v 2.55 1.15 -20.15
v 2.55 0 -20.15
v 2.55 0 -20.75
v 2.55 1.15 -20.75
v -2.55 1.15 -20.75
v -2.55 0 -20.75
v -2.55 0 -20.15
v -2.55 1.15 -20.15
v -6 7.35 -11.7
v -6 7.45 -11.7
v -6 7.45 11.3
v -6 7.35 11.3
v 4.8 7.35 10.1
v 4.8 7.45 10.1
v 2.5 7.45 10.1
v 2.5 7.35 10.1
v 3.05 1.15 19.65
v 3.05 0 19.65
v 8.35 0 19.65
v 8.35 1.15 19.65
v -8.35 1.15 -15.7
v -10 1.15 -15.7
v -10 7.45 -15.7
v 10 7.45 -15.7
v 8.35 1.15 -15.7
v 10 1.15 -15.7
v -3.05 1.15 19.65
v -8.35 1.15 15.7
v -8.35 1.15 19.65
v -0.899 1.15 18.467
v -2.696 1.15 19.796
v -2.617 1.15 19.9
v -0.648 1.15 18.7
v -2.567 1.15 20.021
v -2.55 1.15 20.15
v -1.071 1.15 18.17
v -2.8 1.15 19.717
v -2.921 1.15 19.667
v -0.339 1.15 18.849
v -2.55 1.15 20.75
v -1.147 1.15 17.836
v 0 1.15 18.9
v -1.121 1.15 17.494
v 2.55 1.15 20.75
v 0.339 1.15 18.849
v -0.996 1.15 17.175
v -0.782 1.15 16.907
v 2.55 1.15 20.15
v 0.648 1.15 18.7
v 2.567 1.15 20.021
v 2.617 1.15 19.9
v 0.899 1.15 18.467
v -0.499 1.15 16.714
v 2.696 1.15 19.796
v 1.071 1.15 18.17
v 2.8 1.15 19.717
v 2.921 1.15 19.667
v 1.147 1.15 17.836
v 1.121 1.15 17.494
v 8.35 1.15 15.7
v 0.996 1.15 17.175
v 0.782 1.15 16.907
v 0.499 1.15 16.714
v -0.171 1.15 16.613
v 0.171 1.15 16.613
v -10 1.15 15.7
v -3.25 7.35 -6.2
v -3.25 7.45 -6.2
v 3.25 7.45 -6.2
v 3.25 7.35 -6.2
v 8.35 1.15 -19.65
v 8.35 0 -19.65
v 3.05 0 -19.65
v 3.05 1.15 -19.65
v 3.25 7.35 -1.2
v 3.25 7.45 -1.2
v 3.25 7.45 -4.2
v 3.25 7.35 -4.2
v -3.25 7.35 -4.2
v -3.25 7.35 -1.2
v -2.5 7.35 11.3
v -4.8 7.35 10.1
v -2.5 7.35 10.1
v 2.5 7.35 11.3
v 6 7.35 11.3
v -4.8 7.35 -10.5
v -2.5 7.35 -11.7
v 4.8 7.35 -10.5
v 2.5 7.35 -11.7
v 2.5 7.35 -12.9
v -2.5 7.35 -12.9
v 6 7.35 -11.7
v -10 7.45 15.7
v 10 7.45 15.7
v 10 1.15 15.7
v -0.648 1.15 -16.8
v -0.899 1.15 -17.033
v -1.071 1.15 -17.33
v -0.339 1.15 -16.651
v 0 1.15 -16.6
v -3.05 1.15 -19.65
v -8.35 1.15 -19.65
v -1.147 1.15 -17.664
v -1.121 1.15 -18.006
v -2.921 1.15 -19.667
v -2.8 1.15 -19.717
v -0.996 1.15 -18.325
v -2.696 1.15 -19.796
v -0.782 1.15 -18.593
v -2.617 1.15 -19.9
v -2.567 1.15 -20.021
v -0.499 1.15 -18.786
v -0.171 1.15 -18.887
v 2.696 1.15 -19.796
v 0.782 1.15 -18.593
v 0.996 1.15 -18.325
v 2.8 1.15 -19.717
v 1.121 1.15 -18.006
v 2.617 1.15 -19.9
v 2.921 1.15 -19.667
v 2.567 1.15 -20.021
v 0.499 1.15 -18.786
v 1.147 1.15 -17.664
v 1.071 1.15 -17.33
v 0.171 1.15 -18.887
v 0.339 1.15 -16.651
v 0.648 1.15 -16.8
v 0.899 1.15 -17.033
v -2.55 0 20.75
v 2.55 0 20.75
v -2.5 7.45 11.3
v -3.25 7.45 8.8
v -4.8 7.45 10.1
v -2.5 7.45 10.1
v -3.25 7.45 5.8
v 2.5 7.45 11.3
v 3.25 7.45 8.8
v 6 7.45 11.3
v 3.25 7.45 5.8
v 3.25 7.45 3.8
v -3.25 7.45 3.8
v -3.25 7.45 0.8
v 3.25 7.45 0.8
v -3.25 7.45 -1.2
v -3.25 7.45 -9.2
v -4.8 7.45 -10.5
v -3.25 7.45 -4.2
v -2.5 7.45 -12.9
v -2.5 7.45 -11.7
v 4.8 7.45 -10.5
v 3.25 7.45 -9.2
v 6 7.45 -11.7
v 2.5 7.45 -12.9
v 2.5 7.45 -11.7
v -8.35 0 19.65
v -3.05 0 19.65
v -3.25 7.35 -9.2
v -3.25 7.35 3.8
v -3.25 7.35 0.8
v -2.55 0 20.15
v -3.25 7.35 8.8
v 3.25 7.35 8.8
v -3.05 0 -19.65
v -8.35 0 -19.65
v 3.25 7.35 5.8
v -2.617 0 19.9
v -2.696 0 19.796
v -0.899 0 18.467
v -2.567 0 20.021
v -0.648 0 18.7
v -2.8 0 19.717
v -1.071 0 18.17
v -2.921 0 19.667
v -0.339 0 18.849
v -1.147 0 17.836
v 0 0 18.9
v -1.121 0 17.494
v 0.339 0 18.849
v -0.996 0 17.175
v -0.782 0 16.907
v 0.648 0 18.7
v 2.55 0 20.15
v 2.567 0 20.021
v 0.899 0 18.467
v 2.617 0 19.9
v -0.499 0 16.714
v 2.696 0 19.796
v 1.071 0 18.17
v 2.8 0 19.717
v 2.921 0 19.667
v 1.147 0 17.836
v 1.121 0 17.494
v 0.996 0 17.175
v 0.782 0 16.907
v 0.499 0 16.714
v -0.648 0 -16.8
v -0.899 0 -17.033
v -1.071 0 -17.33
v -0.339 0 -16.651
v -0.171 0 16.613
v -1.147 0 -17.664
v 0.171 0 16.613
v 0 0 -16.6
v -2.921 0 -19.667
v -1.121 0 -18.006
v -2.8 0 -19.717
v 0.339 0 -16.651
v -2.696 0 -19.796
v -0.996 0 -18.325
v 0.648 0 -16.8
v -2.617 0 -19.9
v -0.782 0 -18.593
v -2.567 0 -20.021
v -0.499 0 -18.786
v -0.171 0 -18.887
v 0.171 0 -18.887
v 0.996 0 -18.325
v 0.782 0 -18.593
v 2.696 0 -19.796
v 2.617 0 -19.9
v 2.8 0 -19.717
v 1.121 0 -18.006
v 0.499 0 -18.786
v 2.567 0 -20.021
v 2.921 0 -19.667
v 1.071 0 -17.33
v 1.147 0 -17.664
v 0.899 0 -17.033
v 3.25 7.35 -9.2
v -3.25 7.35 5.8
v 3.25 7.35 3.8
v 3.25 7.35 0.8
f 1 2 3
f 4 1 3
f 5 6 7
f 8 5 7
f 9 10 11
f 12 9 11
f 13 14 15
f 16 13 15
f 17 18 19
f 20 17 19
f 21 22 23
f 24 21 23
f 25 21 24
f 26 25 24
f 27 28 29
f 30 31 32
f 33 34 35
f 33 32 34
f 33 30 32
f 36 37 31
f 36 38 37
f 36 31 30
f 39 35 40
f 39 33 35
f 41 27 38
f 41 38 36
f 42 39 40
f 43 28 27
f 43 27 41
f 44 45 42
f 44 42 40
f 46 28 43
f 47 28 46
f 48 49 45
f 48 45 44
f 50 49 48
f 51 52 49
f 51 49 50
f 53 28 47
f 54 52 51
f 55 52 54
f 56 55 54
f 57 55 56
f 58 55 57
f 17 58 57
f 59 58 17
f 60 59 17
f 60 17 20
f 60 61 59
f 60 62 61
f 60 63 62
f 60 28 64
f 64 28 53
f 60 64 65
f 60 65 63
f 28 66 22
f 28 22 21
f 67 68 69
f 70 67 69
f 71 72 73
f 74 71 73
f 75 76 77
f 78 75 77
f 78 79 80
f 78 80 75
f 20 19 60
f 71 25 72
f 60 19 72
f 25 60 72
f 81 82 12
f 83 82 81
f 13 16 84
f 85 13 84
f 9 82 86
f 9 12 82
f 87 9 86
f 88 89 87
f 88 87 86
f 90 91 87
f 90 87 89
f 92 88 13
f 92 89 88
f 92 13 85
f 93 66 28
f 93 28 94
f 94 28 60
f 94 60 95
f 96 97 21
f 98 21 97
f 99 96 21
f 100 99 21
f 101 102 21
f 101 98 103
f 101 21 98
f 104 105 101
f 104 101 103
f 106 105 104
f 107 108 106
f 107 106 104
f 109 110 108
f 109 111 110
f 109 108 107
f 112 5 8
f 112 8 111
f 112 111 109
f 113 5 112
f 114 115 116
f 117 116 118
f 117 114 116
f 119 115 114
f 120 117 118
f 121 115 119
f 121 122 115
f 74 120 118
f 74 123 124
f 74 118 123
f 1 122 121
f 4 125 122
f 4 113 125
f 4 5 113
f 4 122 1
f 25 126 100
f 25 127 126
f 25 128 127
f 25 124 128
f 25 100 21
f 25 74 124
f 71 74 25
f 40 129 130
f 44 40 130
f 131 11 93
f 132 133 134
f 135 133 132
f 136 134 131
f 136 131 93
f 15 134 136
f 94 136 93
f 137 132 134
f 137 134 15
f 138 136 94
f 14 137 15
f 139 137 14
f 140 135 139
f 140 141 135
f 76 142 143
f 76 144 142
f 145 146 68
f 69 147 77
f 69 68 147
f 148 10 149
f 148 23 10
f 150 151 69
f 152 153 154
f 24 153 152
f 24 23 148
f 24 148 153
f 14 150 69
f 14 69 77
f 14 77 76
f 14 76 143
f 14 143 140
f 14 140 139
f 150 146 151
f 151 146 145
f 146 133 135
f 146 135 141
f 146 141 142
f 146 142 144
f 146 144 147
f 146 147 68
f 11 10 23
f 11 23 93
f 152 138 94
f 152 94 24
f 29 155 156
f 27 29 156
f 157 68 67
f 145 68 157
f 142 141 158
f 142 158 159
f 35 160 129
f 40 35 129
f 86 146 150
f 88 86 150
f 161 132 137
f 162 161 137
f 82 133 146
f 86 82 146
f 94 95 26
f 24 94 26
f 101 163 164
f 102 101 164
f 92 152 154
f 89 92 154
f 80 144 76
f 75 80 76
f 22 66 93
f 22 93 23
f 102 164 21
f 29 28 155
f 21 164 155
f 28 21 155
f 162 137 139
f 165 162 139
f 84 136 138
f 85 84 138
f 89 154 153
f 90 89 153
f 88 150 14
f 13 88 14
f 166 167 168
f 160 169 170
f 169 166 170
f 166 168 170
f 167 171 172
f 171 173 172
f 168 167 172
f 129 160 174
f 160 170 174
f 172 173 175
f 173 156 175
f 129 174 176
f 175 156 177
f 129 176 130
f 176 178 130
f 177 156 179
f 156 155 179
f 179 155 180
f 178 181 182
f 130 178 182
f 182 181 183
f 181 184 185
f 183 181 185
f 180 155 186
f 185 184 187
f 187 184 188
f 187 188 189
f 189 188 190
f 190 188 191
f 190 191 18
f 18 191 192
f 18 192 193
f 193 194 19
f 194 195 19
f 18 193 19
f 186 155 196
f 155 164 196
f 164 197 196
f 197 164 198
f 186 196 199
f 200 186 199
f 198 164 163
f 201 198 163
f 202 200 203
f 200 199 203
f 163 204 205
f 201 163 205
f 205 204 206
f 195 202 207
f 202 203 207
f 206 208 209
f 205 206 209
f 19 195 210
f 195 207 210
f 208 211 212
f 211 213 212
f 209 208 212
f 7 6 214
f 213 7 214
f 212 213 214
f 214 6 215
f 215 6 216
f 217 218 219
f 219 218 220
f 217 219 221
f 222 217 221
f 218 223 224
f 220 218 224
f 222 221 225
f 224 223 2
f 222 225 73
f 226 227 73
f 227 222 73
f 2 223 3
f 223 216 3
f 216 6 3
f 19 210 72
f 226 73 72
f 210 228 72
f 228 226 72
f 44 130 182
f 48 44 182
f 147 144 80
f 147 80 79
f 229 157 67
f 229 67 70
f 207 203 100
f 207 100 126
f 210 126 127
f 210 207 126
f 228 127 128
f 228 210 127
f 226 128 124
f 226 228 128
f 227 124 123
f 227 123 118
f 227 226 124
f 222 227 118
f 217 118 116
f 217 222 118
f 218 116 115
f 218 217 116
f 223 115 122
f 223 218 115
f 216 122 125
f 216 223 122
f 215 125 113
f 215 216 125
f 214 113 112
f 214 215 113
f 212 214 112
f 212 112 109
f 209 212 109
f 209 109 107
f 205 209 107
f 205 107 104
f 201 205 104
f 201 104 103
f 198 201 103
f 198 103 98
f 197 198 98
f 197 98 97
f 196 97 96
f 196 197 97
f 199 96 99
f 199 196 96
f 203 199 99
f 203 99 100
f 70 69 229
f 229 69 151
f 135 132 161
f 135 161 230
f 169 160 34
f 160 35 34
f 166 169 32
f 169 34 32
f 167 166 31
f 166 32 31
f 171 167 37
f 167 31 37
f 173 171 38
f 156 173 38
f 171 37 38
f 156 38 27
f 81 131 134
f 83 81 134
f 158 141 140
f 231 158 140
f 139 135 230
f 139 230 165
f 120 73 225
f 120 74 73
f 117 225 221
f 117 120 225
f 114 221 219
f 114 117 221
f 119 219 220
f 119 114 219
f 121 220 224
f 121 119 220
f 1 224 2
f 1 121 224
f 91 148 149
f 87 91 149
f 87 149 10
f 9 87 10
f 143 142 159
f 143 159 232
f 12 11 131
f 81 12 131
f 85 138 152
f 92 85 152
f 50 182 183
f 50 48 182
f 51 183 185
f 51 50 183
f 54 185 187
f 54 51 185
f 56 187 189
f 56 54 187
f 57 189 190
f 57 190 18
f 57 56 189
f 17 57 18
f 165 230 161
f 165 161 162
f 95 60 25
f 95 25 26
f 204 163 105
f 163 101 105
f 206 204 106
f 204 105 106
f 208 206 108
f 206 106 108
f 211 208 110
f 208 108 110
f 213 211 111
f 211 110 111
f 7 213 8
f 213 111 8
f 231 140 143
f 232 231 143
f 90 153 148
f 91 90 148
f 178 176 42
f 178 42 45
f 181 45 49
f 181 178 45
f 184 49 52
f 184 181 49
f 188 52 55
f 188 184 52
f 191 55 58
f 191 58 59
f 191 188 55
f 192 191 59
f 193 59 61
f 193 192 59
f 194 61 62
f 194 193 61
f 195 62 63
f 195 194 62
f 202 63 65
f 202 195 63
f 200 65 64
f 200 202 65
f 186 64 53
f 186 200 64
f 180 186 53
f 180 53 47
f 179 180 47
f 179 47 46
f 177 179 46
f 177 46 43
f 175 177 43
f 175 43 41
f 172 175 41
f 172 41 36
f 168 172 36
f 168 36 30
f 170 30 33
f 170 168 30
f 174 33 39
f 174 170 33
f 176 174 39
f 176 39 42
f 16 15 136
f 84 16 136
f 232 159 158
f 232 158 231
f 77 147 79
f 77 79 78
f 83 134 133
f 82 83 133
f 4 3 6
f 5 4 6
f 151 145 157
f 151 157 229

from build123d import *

# Parameters (mm, degrees)
ESQUISSE1_R             = 1.15
BOSS_EXTRU_1_DEPTH      = 1.15
CONG_1_R                = 0.5
ESQUISSE2_W             = 20
ESQUISSE2_H             = 31.4
BOSS_EXTRU_2_DEPTH      = 6.3
ESQUISSE4_W             = 6.5
ESQUISSE4_H             = 3
ENL_V_MAT_EXTRU_1_DEPTH = 0.1


with BuildPart() as part:
    # Esquisse1 → Boss.-Extru.1 (new body)
    with BuildSketch(Plane(origin=(0, 0, 0), x_dir=(1, 0, 0), z_dir=(0, 1, 0))):
        Polygon((-2.55, -19.65), (-2.55, -20.75), (2.55, -20.75), (2.55, -19.65), (8.35, -19.65), (8.35, 19.65), (2.55, 19.65), (2.55, 20.75), (-2.55, 20.75), (-2.55, 19.65), (-8.35, 19.65), (-8.35, -19.65), align=None)
        with Locations(Location((0, -17.75, 0), (0, 0, 270))):
            Circle(ESQUISSE1_R, mode=Mode.SUBTRACT)
        with Locations(Location((0, 17.75, 0), (0, 0, 270))):
            Circle(ESQUISSE1_R, mode=Mode.SUBTRACT)
    extrude(amount=BOSS_EXTRU_1_DEPTH)

    # Congé1
    cong_1_edges = [part.edges().sort_by_distance(p)[0] for p in [
        (-2.55, 0.575, 19.65),
        (-2.55, 0.575, -19.65),
        (2.55, 0.575, -19.65),
        (2.55, 0.575, 19.65),
    ]]
    fillet(cong_1_edges, radius=CONG_1_R)

    # Esquisse2 → Boss.-Extru.2 (add)
    with BuildSketch(Plane(origin=(0, 1.15, 0), x_dir=(1, 0, 0), z_dir=(0, 1, 0))):
        Rectangle(ESQUISSE2_W, ESQUISSE2_H)
    extrude(amount=BOSS_EXTRU_2_DEPTH)

    # Esquisse4 → Enlèv. mat.-Extru.1 (cut)
    with BuildSketch(Plane(origin=(0, 7.45, 0), x_dir=(1, 0, 0), z_dir=(0, 1, 0))):
        Polygon((0, 12.9), (0, 10.5), (4.8, 10.5), (4.8, -10.1), (2.5, -10.1), (2.5, -11.3), (6, -11.3), (6, 11.7), (2.5, 11.7), (2.5, 12.9), align=None)
        Polygon((-2.5, -11.3), (-2.5, -10.1), (-4.8, -10.1), (-4.8, 10.5), (0, 10.5), (0, 12.9), (-2.5, 12.9), (-2.5, 11.7), (-6, 11.7), (-6, -11.3), align=None)
        with Locations((0, 7.7)):
            Rectangle(ESQUISSE4_W, ESQUISSE4_H)
        with Locations((0, -2.3)):
            Rectangle(ESQUISSE4_W, ESQUISSE4_H)
        with Locations((0, -7.3)):
            Rectangle(ESQUISSE4_W, ESQUISSE4_H)
        with Locations((0, 2.7)):
            Rectangle(ESQUISSE4_W, ESQUISSE4_H)
    extrude(amount=-ENL_V_MAT_EXTRU_1_DEPTH, mode=Mode.SUBTRACT)


solid = part.part
